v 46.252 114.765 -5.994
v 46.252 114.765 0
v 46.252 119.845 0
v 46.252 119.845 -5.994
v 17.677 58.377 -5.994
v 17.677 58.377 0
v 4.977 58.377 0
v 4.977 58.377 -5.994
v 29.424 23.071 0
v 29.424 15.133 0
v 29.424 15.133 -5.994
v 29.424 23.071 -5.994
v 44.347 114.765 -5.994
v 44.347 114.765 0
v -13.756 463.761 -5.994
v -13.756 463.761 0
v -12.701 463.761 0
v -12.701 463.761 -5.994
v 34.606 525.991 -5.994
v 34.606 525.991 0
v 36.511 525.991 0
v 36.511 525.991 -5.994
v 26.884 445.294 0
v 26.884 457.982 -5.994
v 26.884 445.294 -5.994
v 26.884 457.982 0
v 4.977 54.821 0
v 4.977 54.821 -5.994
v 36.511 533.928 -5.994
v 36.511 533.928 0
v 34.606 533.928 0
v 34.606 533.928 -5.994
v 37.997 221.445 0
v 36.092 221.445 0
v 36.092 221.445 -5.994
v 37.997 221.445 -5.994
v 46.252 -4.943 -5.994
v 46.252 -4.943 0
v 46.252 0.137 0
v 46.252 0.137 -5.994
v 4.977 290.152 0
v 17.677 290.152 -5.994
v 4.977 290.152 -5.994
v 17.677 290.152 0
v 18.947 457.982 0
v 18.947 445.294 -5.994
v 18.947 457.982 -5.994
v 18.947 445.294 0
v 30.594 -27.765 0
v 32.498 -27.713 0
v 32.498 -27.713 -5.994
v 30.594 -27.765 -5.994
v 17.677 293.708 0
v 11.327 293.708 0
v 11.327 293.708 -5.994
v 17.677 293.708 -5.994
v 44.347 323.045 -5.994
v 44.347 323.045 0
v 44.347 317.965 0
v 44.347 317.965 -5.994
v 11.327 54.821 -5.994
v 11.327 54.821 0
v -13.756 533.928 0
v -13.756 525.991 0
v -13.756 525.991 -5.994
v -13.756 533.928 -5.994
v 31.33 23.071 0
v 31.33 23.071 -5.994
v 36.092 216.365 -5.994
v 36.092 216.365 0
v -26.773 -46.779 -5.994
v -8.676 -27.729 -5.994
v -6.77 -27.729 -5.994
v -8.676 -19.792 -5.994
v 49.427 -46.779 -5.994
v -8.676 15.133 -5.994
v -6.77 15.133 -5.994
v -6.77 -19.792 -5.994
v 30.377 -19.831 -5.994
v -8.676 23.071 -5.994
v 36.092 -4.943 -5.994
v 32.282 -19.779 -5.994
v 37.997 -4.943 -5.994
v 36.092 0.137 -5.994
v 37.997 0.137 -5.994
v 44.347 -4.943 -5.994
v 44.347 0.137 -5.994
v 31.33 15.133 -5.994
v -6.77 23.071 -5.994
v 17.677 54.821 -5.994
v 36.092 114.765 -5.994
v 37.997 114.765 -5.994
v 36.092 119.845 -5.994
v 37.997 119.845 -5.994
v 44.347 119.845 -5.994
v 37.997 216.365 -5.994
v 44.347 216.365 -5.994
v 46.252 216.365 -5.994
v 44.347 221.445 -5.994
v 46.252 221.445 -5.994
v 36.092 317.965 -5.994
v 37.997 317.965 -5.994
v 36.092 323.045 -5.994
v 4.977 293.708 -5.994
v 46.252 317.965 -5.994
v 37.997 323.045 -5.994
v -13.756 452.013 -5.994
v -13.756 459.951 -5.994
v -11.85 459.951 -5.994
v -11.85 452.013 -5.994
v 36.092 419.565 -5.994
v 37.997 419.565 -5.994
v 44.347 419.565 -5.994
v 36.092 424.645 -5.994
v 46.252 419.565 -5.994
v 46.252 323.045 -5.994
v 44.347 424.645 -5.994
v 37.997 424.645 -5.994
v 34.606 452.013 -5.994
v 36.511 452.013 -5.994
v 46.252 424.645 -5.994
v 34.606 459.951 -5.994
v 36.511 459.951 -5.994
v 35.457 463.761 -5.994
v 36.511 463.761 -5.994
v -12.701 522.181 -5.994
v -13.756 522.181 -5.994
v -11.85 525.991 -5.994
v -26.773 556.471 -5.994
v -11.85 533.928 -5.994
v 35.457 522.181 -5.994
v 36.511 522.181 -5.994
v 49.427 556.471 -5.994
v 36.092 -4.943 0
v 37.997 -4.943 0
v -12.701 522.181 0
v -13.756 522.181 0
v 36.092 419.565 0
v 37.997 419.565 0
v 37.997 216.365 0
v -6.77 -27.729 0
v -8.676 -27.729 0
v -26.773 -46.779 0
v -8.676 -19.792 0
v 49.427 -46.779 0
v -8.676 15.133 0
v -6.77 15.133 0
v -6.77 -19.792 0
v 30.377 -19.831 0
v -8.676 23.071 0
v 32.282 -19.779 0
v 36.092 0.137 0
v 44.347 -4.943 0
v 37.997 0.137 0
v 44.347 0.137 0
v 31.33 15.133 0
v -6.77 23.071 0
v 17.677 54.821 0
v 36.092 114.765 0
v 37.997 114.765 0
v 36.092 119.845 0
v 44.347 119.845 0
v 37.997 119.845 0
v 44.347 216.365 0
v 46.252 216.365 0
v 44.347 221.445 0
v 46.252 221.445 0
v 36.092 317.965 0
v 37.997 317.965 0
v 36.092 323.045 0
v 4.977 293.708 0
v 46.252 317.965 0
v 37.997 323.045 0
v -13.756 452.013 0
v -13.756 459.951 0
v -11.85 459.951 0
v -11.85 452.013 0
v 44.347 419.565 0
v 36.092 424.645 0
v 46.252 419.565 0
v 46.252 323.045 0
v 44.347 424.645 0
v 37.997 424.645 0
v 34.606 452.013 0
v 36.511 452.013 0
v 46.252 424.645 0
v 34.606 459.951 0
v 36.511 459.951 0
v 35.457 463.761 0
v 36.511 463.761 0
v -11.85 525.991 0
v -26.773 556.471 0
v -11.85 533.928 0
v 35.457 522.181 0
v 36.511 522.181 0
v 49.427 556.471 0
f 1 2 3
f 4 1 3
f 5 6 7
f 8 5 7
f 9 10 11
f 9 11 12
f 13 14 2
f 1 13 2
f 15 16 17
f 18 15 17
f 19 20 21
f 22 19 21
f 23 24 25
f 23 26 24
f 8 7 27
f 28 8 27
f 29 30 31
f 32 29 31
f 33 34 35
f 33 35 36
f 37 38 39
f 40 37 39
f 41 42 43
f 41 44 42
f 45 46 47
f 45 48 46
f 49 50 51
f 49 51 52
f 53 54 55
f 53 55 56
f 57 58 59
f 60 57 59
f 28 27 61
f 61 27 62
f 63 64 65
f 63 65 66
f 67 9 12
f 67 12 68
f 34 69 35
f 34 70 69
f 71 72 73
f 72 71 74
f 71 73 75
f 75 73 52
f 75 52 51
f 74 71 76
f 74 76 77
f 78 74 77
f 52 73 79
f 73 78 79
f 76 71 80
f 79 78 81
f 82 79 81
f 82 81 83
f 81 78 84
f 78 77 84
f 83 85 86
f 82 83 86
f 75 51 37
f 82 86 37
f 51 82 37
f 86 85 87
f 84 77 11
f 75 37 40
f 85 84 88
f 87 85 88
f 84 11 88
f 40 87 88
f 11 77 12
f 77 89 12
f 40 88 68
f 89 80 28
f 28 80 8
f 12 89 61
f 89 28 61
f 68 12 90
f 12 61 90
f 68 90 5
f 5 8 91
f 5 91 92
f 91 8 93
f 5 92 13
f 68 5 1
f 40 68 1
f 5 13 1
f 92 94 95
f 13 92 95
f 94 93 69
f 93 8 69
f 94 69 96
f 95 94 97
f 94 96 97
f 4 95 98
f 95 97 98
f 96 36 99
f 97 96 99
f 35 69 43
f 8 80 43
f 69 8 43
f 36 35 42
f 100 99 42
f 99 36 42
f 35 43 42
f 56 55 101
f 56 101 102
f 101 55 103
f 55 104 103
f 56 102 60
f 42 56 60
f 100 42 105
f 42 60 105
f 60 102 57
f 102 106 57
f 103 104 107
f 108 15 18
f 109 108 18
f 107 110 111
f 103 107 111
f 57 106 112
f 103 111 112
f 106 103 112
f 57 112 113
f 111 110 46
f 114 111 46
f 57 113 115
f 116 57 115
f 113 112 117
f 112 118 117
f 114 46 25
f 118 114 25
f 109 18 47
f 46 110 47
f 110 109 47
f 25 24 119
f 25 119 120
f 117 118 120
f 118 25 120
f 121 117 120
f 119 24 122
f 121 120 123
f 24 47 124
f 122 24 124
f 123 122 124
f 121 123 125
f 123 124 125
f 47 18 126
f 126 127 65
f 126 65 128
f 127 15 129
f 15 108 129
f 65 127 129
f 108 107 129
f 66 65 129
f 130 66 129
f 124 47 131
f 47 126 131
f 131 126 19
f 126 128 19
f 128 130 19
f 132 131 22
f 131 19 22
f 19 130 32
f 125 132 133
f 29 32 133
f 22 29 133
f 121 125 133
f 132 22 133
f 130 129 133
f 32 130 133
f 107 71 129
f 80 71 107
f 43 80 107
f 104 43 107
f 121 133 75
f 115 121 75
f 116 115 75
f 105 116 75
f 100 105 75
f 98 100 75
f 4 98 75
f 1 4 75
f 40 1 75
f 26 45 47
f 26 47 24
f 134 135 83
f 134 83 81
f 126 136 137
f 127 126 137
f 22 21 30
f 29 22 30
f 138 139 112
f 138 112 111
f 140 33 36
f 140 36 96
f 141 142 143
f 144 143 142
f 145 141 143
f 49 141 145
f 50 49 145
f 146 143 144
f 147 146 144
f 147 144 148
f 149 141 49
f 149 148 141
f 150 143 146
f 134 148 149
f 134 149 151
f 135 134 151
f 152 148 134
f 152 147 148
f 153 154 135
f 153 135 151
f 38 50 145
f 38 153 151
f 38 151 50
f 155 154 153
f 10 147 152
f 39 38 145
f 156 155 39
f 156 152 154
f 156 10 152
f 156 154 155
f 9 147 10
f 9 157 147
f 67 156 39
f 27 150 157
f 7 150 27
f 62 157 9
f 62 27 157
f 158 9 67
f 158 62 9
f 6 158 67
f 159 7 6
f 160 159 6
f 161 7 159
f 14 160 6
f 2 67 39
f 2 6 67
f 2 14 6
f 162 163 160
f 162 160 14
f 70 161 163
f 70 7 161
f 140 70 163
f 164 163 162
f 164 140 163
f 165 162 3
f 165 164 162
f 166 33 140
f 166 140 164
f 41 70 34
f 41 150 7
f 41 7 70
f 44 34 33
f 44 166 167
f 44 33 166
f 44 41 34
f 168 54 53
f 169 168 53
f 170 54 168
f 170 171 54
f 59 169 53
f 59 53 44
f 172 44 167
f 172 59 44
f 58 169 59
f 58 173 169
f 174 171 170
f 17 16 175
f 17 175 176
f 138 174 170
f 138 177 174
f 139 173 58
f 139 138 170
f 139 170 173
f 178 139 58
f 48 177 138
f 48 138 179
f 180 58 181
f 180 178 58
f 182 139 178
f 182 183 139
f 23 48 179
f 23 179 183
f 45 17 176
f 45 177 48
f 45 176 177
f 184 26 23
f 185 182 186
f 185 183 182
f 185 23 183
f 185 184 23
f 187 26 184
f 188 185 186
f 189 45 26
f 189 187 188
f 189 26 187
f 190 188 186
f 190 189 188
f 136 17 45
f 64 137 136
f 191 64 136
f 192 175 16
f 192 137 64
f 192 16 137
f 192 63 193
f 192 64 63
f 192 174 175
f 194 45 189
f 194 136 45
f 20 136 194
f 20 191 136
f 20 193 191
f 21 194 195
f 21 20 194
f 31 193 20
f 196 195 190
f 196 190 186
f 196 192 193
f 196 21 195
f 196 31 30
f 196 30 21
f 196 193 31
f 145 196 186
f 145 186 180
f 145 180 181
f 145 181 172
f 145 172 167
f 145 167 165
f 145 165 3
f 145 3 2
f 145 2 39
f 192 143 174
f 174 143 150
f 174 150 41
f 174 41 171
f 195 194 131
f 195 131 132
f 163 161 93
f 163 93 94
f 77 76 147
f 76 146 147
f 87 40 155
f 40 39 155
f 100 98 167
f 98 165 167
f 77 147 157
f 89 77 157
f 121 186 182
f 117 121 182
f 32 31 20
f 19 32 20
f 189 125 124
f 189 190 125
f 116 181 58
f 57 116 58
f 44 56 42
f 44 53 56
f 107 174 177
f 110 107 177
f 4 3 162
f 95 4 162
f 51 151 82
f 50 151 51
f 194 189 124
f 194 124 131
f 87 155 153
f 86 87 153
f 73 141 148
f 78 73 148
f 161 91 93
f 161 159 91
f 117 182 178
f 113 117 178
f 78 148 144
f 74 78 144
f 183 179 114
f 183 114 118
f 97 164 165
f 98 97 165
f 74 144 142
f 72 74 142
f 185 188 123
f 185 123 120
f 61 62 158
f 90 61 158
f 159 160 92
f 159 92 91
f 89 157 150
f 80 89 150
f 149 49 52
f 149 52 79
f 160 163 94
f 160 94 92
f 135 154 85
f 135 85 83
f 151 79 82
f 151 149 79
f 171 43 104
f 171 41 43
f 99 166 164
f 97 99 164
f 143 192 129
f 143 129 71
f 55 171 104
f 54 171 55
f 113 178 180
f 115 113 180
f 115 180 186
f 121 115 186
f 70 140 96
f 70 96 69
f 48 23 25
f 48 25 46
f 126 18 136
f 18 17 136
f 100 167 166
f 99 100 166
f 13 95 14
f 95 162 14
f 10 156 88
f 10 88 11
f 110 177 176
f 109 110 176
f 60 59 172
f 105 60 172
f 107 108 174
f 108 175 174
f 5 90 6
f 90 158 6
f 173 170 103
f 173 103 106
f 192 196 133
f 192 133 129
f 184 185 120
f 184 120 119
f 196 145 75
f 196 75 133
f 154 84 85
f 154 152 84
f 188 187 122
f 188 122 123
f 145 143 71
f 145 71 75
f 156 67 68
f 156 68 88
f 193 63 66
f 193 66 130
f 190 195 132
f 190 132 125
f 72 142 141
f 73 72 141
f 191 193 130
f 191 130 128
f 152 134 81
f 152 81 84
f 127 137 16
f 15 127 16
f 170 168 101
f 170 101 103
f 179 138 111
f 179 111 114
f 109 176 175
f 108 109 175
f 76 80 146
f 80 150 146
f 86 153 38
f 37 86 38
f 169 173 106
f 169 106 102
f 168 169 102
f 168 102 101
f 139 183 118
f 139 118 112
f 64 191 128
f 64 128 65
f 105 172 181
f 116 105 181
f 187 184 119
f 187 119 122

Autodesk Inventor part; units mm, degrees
ref_plane "YZ Plane" through (0, 0, 0) normal (1, 0, 0) x (0, 1, 0)
ref_plane "XZ Plane" through (0, 0, 0) normal (0, 1, 0) x (-1, 0, 0)
ref_plane "XY Plane" through (0, 0, 0) normal (0, 0, 1) x (1, 0, 0)
sketch "Sketch1" plane through (0, 0, 0) normal (0, 0, 1) x (1, 0, 0)
  point P0 (0, 0)
sketch "Sketch2" plane through (0, 0, 0) normal (0, 0, 1) x (1, 0, 0)
  line L0 (-26.773, -46.7791) -> (49.427, -46.7791)
  line L1 (49.427, -46.7791) -> (49.427, 556.4709)
  line L2 (-26.773, 556.4709) -> (-26.773, -46.7791)
  line L3 (-13.7555, 533.9284) -> (-11.8505, 533.9284)
  line L4 (-11.8505, 533.9284) -> (-11.8505, 525.9909)
  line L5 (-11.8505, 525.9909) -> (-13.7555, 525.9909)
  line L6 (-13.7555, 525.9909) -> (-13.7555, 533.9284)
  line L7 (46.252, 424.6449) -> (44.347, 424.6449)
  line L8 (44.347, 424.6449) -> (44.347, 419.5649)
  line L9 (44.347, 419.5649) -> (46.252, 419.5649)
  line L10 (46.252, 419.5649) -> (46.252, 424.6449)
  line L11 (36.5111, 522.1809) -> (36.5111, 463.7609)
  line L12 (36.5111, 463.7609) -> (35.457, 463.7609)
  line L13 (35.457, 463.7609) -> (35.457, 522.1809)
  line L14 (35.457, 522.1809) -> (36.5111, 522.1809)
  line L15 (-13.7555, 522.1809) -> (-13.7555, 463.7609)
  line L16 (-13.7555, 463.7609) -> (-12.7014, 463.7609)
  line L17 (-12.7014, 463.7609) -> (-12.7014, 522.1809)
  line L18 (-12.7014, 522.1809) -> (-13.7555, 522.1809)
  line L19 (26.8845, 445.2941) -> (18.947, 445.2941)
  line L20 (18.947, 445.2941) -> (18.947, 457.9824)
  line L21 (18.947, 457.9824) -> (26.8845, 457.9824)
  line L22 (26.8845, 457.9824) -> (26.8845, 445.2941)
  line L23 (11.327, 54.8209) -> (17.677, 54.8209)
  line L24 (17.677, 54.8209) -> (17.677, 58.3769)
  line L25 (17.677, 58.3769) -> (4.977, 58.3769)
  line L26 (4.977, 58.3769) -> (4.977, 54.8209)
  line L27 (4.977, 54.8209) -> (11.327, 54.8209)
  line L28 (11.327, 293.7079) -> (17.677, 293.7079)
  line L29 (17.677, 293.7079) -> (17.677, 290.1519)
  line L30 (17.677, 290.1519) -> (4.977, 290.1519)
  line L31 (4.977, 290.1519) -> (4.977, 293.7079)
  line L32 (4.977, 293.7079) -> (11.327, 293.7079)
  line L33 (36.092, 424.6449) -> (37.997, 424.6449)
  line L34 (37.997, 424.6449) -> (37.997, 419.5649)
  line L35 (37.997, 419.5649) -> (36.092, 419.5649)
  line L36 (36.092, 419.5649) -> (36.092, 424.6449)
  line L37 (46.252, 323.0449) -> (44.347, 323.0449)
  line L38 (44.347, 323.0449) -> (44.347, 317.9649)
  line L39 (44.347, 317.9649) -> (46.252, 317.9649)
  line L40 (46.252, 317.9649) -> (46.252, 323.0449)
  line L41 (36.092, 323.0449) -> (37.997, 323.0449)
  line L42 (37.997, 323.0449) -> (37.997, 317.9649)
  line L43 (37.997, 317.9649) -> (36.092, 317.9649)
  line L44 (36.092, 317.9649) -> (36.092, 323.0449)
  line L45 (46.252, 221.4449) -> (44.347, 221.4449)
  line L46 (44.347, 221.4449) -> (44.347, 216.3649)
  line L47 (44.347, 216.3649) -> (46.252, 216.3649)
  line L48 (46.252, 216.3649) -> (46.252, 221.4449)
  line L49 (36.092, 221.4449) -> (37.997, 221.4449)
  line L50 (37.997, 221.4449) -> (37.997, 216.3649)
  line L51 (37.997, 216.3649) -> (36.092, 216.3649)
  line L52 (36.092, 216.3649) -> (36.092, 221.4449)
  line L53 (46.252, 0.1368) -> (44.347, 0.1368)
  line L54 (44.347, 0.1368) -> (44.347, -4.9432)
  line L55 (44.347, -4.9432) -> (46.252, -4.9432)
  line L56 (46.252, -4.9432) -> (46.252, 0.1368)
  line L57 (36.092, 0.1368) -> (37.997, 0.1368)
  line L58 (37.997, 0.1368) -> (37.997, -4.9432)
  line L59 (37.997, -4.9432) -> (36.092, -4.9432)
  line L60 (36.092, -4.9432) -> (36.092, 0.1368)
  line L61 (49.427, 556.4709) -> (-26.773, 556.4709)
  line L62 (46.252, 424.6449) -> (147.852, 424.6449) construction
  line L63 (46.252, 119.8449) -> (147.852, 119.8449) construction
  line L64 (46.252, 119.8449) -> (44.347, 119.8449)
  line L65 (44.347, 119.8449) -> (44.347, 114.7649)
  line L66 (44.347, 114.7649) -> (46.252, 114.7649)
  line L67 (46.252, 114.7649) -> (46.252, 119.8449)
  line L68 (36.092, 119.8449) -> (37.997, 119.8449)
  line L69 (36.092, 114.7649) -> (36.092, 119.8449)
  line L70 (37.997, 114.7649) -> (36.092, 114.7649)
  line L71 (37.997, 119.8449) -> (37.997, 114.7649)
  line L72 (36.5111, 533.9284) -> (34.6061, 533.9284)
  line L73 (34.6061, 533.9284) -> (34.6061, 525.9909)
  line L74 (34.6061, 525.9909) -> (36.5111, 525.9909)
  line L75 (36.5111, 525.9909) -> (36.5111, 533.9284)
  line L76 (-13.7555, 452.0134) -> (-11.8505, 452.0134)
  line L77 (-11.8505, 452.0134) -> (-11.8505, 459.9509)
  line L78 (-11.8505, 459.9509) -> (-13.7555, 459.9509)
  line L79 (-13.7555, 459.9509) -> (-13.7555, 452.0134)
  line L80 (34.6061, 459.9509) -> (36.5111, 459.9509)
  line L81 (34.6061, 452.0134) -> (34.6061, 459.9509)
  line L82 (36.5111, 459.9509) -> (36.5111, 452.0134)
  line L83 (36.5111, 452.0134) -> (34.6061, 452.0134)
  line L84 (29.4245, 23.0709) -> (31.3295, 23.0709)
  line L85 (31.3295, 23.0709) -> (31.3295, 15.1334)
  line L86 (29.4245, 15.1334) -> (29.4245, 23.0709)
  line L87 (31.3295, 15.1334) -> (29.4245, 15.1334)
  line L88 (-6.7705, 23.0709) -> (-8.6755, 23.0709)
  line L89 (-8.6755, 15.1334) -> (-6.7705, 15.1334)
  line L90 (-8.6755, 23.0709) -> (-8.6755, 15.1334)
  line L91 (-6.7705, 15.1334) -> (-6.7705, 23.0709)
  line L92 (30.3774, -19.8306) -> (32.2817, -19.7787)
  line L93 (32.4981, -27.7132) -> (30.5938, -27.7652)
  line L94 (32.2817, -19.7787) -> (32.4981, -27.7132)
  line L95 (30.5938, -27.7652) -> (30.3774, -19.8306)
  line L96 (-6.7705, -19.7916) -> (-8.6755, -19.7916)
  line L97 (-8.6755, -19.7916) -> (-8.6755, -27.7291)
  line L98 (-8.6755, -27.7291) -> (-6.7705, -27.7291)
  line L99 (-6.7705, -27.7291) -> (-6.7705, -19.7916)
  point P0 (30.377, 23.0709)
  point P1 (-7.723, 23.0709)
  point P2 (-7.723, 23.0709)
  point P3 (30.377, -19.7916)
  point P4 (-6.7705, -27.7291)
  point P5 (-7.723, -19.7916)
  point P6 (-7.723, -19.7916)
  dimension "d0" = 76.2
  dimension "d4" = 1.905
  dimension "d5" = 7.9375
  dimension "d8" = 58.42
  dimension "d13" = 7.9375
  dimension "d16" = 6.35
  dimension "d17" = 3.556
  dimension "d18" = 12.7
extrude "Extrusion3" add sketch "Sketch2" against normal blind 5.9944
properties part number "Tenda Wifi Buoy Mounting Plate"
